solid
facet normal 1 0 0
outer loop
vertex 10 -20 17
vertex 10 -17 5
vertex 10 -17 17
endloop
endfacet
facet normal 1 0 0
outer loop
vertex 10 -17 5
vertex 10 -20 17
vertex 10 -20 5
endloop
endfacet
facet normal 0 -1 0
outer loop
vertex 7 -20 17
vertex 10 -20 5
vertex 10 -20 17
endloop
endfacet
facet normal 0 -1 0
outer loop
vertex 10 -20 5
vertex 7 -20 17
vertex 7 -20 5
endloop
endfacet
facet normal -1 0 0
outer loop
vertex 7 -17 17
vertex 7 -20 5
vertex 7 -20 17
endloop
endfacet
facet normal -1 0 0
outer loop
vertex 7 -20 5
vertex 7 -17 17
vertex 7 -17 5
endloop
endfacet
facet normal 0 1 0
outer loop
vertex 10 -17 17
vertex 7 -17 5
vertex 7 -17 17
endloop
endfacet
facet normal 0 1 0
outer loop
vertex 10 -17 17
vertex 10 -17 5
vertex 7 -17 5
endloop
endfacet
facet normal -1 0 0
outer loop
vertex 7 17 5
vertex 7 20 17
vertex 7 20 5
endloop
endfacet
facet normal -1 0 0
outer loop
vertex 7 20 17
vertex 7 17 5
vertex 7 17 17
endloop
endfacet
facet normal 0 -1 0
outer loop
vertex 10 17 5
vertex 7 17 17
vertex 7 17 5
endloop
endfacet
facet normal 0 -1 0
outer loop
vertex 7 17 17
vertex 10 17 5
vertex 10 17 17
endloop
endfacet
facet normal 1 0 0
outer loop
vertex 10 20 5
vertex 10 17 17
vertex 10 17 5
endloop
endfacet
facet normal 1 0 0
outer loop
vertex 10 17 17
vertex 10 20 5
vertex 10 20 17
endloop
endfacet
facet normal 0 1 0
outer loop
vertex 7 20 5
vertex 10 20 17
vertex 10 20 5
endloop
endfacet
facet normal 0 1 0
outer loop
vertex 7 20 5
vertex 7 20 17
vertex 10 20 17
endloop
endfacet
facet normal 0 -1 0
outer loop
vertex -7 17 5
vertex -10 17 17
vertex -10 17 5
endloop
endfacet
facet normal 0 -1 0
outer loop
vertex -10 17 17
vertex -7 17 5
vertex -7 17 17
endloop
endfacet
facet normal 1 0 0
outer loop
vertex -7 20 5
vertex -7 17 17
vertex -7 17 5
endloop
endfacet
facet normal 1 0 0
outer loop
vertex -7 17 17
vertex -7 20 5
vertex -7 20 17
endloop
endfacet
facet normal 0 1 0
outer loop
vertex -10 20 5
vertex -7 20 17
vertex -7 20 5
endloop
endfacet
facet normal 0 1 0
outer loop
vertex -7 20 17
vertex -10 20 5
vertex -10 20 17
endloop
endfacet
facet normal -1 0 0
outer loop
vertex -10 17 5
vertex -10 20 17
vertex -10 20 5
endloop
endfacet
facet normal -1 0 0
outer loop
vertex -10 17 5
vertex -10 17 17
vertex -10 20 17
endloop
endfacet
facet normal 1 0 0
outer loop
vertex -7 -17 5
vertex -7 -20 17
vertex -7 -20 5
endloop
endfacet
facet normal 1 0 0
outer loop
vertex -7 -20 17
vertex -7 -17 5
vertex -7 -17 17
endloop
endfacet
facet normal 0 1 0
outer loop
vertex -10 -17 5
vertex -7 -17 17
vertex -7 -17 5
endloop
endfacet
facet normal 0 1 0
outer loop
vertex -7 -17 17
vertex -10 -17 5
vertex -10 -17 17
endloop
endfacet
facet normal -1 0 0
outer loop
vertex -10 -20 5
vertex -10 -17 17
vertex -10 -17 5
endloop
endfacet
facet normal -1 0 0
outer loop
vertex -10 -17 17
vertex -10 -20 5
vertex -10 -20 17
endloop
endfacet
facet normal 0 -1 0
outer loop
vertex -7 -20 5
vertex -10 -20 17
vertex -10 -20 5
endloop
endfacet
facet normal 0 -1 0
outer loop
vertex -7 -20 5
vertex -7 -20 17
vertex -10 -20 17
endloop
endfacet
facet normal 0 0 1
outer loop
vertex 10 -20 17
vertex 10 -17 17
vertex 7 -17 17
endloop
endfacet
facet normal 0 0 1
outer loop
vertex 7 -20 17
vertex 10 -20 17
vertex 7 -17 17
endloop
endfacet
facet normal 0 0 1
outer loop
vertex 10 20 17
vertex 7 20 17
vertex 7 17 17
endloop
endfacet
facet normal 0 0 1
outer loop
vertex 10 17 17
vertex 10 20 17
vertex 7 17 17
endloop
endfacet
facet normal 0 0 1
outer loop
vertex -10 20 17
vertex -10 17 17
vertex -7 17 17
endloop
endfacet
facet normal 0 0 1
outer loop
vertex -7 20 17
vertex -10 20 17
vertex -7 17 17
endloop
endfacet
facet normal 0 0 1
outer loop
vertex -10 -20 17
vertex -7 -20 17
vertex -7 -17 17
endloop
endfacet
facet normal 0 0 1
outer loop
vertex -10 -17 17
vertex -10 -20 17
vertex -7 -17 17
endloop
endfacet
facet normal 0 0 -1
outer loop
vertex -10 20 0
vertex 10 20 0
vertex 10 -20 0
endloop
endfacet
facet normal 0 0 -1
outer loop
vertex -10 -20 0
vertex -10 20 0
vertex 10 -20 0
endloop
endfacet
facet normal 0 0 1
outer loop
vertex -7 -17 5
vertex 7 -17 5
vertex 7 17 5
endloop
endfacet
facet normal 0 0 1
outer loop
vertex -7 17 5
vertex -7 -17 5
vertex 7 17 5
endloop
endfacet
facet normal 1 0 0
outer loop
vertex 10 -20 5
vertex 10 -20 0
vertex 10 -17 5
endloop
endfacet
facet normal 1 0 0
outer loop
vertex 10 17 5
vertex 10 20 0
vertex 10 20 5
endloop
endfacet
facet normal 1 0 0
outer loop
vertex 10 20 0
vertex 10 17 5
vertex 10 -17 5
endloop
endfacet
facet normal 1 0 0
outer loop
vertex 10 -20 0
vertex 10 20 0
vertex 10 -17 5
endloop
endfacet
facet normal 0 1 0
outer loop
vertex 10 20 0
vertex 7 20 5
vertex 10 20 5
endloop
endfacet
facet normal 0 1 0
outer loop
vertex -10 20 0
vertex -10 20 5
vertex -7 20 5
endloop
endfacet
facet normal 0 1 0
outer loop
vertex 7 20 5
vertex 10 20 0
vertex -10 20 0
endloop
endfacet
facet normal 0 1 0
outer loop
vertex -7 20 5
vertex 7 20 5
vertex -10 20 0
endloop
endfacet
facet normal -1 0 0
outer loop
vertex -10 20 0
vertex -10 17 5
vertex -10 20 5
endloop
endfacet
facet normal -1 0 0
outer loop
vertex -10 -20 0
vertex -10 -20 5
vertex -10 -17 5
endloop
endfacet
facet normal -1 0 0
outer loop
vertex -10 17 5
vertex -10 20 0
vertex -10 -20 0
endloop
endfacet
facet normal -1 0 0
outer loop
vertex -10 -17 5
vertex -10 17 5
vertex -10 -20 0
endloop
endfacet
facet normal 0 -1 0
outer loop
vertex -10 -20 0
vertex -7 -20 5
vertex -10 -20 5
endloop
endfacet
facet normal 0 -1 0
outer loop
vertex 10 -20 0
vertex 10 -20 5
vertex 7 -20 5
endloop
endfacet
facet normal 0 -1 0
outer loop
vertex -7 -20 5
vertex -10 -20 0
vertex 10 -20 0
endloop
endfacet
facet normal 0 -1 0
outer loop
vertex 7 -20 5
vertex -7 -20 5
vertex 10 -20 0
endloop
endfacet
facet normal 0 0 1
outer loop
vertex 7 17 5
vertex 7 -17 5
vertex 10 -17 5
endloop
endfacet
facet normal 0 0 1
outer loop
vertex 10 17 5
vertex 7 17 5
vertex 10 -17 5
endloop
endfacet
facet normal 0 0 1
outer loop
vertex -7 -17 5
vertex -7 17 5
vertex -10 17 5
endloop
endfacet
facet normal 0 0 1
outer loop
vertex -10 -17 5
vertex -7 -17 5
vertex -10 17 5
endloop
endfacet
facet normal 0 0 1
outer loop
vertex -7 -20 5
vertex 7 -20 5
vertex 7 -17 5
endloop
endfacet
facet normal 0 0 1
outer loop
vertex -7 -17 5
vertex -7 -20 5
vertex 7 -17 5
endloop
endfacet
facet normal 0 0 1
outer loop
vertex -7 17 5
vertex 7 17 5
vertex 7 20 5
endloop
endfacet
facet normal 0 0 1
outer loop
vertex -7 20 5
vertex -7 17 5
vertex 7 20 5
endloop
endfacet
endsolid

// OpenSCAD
length = 40;
width  =20;
depth = 5;

cross =3;
leg_length =12;




echo(" length table is ", length, " mm");
 echo(" width table is ", width, " mm");
echo(" depth table top is ", depth, " mm");
 echo(" width table leg is ", cross, " mm");
 echo(" height table leg is ", leg_length, " mm");
 echo(" overall height table  is ", leg_length + depth, " mm");




table();


l = length/2;
w = width/2;


module table()
{


polyhedron
       (points = [
                 [ -w,  l, 0],
                 [ -w, -l, 0],
                 [  w, -l, 0],
                 [  w,  l, 0],
                 [ -w,  l,  depth],
                 [ -w, -l,  depth],
                 [  w, -l,  depth],
                 [  w,  l,  depth],
                 [  w-cross, -l,  depth],
                 [  w-cross, cross-l,  depth],
                 [  w, cross-l,  depth],
                 [  w, -l,  leg_length + depth],
                 [  w-cross, -l,  leg_length + depth],
                 [  w-cross, cross-l,  leg_length + depth],
                 [  w, cross-l,  leg_length + depth],
                 [  w,  l-cross,  depth],
                 [  w-cross,  l-cross,  depth],
                 [  w-cross,  l,  depth],
                 [  w,  l,  leg_length + depth],
                 [  w,  l-cross,  leg_length + depth],
                 [  w-cross,  l-cross,  leg_length + depth],
                 [  w-cross,  l,  leg_length + depth],
                 [ cross-w,  l,  depth],
                 [ cross-w,  l-cross,  depth],
                 [ -w,  l-cross,  depth],
                 [ -w,  l,  leg_length + depth],
                 [ cross-w,  l,  leg_length + depth],
                 [ cross-w,  l-cross,  leg_length + depth],
                 [ -w,  l-cross,  leg_length + depth],
                 [ -w, cross-l,  depth],
                 [ cross-w, cross-l,  depth],
                 [ cross-w, -l,  depth],
                 [ -w, -l,  leg_length + depth],
                 [ -w, cross-l,  leg_length + depth],
                 [ cross-w, cross-l,  leg_length + depth],
                 [ cross-w, -l,  leg_length + depth],
                ],
           triangles = [
                 [   14,   10,   11],[    6,   11,   10],
                 [   11,    6,   12],[    8,   12,    6],
                 [   12,    8,   13],[    9,   13,    8],
                 [   13,    9,   14],[    9,   10,   14],
                 [   17,   21,   16],[   20,   16,   21],
                 [   16,   20,   15],[   19,   15,   20],
                 [   15,   19,    7],[   18,    7,   19],
                 [    7,   18,   17],[   18,   21,   17],
                 [   24,   28,   23],[   27,   23,   28],
                 [   23,   27,   22],[   26,   22,   27],
                 [   22,   26,    4],[   25,    4,   26],
                 [    4,   25,   24],[   25,   28,   24],
                 [   31,   35,   30],[   34,   30,   35],
                 [   30,   34,   29],[   33,   29,   34],
                 [   29,   33,    5],[   32,    5,   33],
                 [    5,   32,   31],[   32,   35,   31],
                 [   13,   14,   11],[   13,   11,   12],
                 [   20,   21,   18],[   20,   18,   19],
                 [   27,   28,   25],[   27,   25,   26],
                 [   34,   35,   32],[   34,   32,   33],
                 [    2,    3,    0],[    2,    0,    1],
                 [   16,    9,   30],[   16,   30,   23],
                 [   10,    2,    6],[    7,    3,   15],
                 [   10,   15,    3],[   10,    3,    2],
                 [    7,   17,    3],[   22,    4,    0],
                 [    0,    3,   17],[    0,   17,   22],
                 [    4,   24,    0],[   29,    5,    1],
                 [    1,    0,   24],[    1,   24,   29],
                 [    5,   31,    1],[    8,    6,    2],
                 [    2,    1,   31],[    2,   31,    8],
                 [   10,    9,   16],[   10,   16,   15],
                 [   24,   23,   30],[   24,   30,   29],
                 [    9,    8,   31],[    9,   31,   30],
                 [   17,   16,   23],[   17,   23,   22],
                 ]
      );

}
